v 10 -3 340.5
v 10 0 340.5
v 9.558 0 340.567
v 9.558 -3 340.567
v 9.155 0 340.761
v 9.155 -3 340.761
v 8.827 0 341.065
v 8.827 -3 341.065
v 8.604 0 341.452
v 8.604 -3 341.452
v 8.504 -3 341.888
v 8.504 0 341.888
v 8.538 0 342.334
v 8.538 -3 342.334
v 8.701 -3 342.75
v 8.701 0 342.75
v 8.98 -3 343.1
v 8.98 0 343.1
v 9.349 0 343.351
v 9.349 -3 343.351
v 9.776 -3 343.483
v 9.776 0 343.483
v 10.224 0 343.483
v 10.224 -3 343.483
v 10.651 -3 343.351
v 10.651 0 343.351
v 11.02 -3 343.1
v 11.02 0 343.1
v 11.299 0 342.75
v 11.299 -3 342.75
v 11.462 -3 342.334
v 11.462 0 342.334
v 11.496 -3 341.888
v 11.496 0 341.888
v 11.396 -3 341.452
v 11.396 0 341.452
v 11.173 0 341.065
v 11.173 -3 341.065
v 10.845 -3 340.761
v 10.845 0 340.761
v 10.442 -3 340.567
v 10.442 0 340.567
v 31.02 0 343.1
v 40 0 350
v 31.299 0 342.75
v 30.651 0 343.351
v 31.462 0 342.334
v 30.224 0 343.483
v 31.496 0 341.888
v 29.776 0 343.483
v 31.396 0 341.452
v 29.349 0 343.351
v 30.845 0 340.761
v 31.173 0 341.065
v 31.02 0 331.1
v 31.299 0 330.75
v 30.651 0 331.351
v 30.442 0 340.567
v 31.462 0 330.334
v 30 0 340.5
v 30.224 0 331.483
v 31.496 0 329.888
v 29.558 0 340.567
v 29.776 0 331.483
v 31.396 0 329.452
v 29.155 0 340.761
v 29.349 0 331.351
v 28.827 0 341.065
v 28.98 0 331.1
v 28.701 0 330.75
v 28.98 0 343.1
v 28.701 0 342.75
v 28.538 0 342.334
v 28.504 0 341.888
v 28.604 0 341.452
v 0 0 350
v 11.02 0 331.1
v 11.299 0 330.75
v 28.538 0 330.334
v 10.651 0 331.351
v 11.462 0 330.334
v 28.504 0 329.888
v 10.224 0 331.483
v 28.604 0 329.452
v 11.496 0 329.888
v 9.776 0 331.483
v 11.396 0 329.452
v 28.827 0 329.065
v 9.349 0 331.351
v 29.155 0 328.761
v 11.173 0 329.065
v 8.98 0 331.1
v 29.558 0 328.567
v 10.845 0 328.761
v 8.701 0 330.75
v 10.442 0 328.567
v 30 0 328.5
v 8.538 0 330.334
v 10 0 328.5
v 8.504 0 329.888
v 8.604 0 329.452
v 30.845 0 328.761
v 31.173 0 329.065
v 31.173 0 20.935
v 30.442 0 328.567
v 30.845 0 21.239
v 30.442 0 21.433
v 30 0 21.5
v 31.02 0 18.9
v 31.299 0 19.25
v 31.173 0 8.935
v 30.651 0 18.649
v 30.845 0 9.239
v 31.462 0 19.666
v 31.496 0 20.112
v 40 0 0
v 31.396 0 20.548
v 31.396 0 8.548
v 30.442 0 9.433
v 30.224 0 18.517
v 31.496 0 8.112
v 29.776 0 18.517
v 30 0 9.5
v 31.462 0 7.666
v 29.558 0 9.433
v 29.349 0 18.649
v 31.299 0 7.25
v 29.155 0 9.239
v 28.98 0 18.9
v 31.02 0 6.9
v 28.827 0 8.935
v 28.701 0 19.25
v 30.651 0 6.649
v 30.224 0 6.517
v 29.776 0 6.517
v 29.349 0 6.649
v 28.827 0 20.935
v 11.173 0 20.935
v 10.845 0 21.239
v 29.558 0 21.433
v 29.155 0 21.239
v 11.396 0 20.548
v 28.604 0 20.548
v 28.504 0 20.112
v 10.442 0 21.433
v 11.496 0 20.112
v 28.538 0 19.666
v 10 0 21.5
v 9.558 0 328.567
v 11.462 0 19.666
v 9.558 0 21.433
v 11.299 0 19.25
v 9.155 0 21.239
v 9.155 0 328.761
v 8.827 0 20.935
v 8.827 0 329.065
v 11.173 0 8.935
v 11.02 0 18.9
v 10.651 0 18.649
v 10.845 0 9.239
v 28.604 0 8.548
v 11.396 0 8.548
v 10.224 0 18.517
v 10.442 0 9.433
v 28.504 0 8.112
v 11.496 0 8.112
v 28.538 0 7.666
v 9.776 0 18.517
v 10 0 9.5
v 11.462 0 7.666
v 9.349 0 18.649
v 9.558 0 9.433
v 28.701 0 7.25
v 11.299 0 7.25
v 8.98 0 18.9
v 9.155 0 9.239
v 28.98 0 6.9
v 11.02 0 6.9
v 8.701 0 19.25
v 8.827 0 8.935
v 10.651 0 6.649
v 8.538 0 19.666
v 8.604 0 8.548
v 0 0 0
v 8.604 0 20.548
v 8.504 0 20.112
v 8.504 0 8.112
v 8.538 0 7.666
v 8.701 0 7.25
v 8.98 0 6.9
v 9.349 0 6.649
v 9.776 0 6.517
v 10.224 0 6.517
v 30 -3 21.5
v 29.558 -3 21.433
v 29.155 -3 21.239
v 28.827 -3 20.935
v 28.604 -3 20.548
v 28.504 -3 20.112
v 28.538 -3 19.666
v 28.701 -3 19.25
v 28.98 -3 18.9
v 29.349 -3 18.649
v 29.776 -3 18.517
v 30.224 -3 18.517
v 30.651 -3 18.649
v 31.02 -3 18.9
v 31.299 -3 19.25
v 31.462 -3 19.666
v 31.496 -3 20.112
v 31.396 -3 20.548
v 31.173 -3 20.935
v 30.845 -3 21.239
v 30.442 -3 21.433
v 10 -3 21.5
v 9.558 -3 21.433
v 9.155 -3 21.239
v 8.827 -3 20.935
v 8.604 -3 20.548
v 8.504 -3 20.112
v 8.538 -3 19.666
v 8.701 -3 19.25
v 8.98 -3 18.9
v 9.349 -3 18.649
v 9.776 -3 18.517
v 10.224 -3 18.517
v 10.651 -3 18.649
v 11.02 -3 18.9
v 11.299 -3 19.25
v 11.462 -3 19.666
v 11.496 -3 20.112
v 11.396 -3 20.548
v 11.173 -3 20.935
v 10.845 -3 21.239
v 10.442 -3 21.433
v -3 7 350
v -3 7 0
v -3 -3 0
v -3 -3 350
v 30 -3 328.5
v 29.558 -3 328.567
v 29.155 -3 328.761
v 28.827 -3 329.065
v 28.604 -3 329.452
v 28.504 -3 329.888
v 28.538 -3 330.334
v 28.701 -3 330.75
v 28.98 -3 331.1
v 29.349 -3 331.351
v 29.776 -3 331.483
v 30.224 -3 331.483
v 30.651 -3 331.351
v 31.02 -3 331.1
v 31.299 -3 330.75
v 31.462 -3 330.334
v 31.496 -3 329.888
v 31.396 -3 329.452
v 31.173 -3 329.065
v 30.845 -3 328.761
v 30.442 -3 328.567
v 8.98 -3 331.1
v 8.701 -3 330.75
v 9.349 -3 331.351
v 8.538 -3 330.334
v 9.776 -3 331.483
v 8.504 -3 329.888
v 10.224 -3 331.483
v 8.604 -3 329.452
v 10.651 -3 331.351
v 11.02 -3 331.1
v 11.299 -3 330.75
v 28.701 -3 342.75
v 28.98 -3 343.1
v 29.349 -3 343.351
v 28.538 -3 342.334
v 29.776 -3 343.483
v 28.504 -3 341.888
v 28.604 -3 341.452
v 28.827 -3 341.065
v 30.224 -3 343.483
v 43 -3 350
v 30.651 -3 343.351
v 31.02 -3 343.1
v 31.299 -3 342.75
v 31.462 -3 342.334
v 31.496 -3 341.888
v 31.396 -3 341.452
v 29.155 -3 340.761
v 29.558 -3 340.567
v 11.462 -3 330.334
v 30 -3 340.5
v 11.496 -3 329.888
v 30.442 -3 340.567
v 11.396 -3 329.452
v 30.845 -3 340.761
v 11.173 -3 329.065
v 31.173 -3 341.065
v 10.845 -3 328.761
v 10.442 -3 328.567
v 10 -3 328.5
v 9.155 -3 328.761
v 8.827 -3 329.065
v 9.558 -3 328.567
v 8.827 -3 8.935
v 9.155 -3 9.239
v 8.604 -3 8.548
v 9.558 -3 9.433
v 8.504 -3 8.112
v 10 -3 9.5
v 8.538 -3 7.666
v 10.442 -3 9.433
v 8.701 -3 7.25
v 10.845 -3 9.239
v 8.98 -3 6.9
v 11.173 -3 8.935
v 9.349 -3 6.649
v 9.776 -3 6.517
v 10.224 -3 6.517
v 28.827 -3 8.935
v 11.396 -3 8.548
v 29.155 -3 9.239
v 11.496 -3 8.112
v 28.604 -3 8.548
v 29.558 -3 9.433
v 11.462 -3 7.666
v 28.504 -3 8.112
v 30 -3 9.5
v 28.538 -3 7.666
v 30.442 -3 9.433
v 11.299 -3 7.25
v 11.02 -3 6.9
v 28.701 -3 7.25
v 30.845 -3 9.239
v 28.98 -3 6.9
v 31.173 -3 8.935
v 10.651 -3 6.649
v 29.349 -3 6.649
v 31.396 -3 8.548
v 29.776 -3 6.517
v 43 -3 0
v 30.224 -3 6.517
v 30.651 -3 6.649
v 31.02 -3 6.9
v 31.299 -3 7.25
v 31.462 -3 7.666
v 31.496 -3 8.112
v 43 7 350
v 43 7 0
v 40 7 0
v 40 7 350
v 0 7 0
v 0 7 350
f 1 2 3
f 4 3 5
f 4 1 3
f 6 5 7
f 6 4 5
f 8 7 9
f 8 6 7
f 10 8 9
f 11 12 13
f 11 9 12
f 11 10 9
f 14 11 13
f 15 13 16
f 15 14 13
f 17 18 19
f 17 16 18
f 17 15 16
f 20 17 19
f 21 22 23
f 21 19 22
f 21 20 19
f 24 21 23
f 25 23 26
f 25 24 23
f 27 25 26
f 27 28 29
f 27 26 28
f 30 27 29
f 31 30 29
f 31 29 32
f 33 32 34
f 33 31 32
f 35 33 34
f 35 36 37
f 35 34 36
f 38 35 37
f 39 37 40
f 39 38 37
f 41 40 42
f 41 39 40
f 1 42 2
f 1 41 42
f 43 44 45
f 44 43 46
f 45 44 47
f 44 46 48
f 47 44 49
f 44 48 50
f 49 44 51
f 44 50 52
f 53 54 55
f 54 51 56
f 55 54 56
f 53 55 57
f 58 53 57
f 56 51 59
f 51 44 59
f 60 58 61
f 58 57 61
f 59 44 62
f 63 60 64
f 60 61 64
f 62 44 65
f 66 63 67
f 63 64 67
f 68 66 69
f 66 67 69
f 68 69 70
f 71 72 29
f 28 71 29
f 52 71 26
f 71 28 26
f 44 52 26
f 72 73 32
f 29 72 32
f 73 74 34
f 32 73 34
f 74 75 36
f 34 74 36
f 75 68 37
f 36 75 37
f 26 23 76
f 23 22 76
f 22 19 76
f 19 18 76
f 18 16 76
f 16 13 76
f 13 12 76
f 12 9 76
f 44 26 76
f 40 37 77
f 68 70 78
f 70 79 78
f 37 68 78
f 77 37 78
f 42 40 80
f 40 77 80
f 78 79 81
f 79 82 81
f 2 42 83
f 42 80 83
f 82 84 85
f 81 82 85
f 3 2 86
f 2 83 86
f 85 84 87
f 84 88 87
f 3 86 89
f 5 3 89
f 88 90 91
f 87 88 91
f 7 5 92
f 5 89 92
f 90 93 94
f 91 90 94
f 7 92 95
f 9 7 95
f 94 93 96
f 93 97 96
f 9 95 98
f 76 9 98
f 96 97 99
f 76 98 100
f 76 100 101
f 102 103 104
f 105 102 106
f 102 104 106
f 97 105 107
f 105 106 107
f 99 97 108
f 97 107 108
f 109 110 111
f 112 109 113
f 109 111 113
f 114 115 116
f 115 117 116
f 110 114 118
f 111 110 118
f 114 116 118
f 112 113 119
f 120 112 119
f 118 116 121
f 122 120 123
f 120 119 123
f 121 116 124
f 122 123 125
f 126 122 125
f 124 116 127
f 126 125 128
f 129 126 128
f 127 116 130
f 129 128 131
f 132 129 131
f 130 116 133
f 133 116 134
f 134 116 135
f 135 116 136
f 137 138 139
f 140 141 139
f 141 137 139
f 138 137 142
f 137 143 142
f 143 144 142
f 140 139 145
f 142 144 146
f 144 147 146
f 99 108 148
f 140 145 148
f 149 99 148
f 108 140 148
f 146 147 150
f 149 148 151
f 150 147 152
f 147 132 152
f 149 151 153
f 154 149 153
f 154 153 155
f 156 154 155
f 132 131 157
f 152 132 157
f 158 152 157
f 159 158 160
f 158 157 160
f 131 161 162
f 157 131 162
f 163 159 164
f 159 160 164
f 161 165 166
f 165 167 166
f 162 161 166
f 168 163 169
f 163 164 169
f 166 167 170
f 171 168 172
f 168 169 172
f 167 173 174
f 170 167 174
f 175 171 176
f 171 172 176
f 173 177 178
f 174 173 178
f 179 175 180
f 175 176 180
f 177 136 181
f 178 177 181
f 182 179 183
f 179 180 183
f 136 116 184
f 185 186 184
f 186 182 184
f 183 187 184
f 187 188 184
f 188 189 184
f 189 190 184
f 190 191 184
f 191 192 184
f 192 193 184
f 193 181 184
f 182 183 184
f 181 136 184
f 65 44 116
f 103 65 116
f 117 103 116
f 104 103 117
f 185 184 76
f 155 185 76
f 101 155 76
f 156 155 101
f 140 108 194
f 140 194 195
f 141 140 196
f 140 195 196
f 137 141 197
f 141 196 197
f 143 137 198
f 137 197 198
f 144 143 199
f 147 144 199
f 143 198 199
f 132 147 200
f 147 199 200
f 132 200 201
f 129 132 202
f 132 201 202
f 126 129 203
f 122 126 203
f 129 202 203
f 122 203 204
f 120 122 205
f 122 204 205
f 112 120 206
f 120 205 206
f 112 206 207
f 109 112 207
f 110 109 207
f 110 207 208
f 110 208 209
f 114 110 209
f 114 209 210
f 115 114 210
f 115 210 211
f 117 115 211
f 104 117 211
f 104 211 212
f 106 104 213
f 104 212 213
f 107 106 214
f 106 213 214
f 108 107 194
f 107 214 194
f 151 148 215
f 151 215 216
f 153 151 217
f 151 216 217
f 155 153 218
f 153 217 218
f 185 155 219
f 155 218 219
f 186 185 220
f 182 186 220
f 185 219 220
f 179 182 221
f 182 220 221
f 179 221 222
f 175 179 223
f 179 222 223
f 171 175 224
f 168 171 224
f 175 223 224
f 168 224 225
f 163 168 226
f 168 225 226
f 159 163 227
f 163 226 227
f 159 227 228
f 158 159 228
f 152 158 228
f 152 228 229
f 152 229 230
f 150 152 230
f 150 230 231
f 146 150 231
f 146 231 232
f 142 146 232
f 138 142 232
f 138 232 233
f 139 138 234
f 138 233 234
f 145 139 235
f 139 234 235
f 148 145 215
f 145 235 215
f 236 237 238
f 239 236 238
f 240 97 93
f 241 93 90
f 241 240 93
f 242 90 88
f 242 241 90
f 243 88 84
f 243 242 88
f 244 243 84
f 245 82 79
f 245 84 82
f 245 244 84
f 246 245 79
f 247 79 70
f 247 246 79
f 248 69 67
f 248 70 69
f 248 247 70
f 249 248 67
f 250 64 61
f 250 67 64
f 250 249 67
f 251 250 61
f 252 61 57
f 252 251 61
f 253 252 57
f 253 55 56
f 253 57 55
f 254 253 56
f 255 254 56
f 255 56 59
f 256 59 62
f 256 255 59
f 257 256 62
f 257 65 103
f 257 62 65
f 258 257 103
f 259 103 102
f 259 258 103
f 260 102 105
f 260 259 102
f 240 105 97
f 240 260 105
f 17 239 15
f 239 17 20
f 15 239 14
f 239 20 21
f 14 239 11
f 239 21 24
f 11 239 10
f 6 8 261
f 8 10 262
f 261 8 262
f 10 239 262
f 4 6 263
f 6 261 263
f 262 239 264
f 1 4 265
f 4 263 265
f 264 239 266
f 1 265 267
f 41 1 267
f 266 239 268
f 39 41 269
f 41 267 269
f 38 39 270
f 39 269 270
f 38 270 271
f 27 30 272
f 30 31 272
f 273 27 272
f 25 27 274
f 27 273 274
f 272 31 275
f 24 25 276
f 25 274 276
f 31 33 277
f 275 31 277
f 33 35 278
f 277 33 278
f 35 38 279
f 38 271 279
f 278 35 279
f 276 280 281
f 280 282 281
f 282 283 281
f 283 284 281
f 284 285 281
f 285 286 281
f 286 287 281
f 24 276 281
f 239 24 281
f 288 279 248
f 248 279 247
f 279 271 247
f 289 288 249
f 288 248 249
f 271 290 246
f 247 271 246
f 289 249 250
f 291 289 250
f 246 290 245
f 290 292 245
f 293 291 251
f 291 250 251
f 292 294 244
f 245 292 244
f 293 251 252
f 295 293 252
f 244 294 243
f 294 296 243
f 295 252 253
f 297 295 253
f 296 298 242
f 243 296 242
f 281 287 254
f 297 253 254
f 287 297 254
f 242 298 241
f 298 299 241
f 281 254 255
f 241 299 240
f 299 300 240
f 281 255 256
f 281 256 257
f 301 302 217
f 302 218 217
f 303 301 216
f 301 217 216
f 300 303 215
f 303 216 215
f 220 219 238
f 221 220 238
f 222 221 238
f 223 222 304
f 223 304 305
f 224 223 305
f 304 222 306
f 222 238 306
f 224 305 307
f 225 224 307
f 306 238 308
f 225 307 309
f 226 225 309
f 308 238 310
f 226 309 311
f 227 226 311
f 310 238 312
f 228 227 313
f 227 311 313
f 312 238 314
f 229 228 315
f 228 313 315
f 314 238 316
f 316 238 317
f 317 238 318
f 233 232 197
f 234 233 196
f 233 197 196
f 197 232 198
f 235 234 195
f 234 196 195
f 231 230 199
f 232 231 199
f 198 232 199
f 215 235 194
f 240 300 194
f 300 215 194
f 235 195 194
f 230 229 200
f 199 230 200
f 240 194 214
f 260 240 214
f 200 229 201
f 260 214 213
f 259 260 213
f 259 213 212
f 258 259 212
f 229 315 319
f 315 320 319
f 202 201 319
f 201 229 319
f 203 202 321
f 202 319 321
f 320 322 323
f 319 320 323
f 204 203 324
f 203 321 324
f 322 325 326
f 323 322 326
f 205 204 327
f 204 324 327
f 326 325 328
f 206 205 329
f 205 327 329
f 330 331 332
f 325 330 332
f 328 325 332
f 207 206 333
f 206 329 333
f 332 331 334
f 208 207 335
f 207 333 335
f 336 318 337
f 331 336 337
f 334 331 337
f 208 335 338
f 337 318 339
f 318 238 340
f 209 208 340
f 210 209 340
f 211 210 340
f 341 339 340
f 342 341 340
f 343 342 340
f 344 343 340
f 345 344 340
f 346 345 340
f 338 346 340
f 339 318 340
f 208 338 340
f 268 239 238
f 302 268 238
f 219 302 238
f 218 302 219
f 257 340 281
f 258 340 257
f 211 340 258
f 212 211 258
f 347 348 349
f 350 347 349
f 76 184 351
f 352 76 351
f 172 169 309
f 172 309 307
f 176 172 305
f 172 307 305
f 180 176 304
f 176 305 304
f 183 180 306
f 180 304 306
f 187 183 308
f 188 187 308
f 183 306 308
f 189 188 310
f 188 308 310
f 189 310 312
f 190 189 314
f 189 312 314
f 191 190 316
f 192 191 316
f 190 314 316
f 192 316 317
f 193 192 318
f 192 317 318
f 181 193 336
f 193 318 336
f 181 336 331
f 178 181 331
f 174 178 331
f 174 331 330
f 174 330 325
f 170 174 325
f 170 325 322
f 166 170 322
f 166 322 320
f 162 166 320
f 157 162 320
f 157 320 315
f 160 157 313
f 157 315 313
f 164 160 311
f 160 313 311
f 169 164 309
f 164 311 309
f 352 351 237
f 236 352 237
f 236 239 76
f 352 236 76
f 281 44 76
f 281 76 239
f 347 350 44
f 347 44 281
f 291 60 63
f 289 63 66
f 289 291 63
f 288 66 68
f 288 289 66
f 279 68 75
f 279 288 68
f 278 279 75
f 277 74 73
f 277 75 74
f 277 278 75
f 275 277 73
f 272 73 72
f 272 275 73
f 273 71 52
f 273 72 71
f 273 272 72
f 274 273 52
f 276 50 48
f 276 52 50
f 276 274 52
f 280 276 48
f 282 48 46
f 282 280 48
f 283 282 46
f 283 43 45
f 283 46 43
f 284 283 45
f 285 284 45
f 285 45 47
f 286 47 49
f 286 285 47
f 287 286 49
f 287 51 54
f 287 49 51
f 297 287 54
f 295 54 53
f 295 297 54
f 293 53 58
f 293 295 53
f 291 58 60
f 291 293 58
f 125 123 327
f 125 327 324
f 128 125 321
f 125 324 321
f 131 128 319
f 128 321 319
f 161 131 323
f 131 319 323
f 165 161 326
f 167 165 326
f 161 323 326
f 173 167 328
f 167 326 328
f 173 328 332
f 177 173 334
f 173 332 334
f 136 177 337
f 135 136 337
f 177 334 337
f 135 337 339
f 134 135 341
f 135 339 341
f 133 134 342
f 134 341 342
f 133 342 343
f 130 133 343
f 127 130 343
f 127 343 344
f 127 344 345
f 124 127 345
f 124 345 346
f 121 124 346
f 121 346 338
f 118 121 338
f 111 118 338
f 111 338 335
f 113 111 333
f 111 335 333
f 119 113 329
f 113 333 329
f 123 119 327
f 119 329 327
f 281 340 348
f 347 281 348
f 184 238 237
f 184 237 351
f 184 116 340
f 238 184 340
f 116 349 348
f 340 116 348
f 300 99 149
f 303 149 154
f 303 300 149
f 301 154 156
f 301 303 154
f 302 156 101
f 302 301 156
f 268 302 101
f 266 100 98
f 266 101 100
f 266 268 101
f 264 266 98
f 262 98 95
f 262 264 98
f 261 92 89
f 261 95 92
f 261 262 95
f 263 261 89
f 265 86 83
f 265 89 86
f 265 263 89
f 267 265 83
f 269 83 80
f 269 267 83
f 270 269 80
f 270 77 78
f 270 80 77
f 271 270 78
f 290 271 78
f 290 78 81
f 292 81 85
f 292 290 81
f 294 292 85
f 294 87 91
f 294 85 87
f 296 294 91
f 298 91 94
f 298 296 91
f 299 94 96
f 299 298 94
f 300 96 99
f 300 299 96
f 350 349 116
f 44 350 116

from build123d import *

# Parameters (mm, degrees)
BOSS_EXTRUDE1_DEPTH            = 350
F_3_0MM_DOWEL_HOLE1_AT_2_COUNT = 2
F_3_0MM_DOWEL_HOLE1_AT_2_PITCH = 20
F_3_0MM_DOWEL_HOLE1_AT_3_COUNT = 2
F_3_0MM_DOWEL_HOLE1_AT_3_PITCH = 23.323807579
F_3_0MM_DOWEL_HOLE1_AT_4_COUNT = 2
F_3_0MM_DOWEL_HOLE1_AT_4_PITCH = 12


with BuildPart() as part:
    # Sketch2 → Boss-Extrude1 (new body)
    with BuildSketch(Plane.XY):
        Polygon((0, 0), (0, 7), (-3, 7), (-3, -3), (43, -3), (43, 7), (40, 7), (40, 0), align=None)
    extrude(amount=BOSS_EXTRUDE1_DEPTH)

    # Sketch3 → Ø3.0mm Dowel Hole1 (revolve, cut)
    with BuildSketch(Plane(origin=(10, -3, 342), x_dir=(0, 0, -1), z_dir=(1, 0, 0))):
        Polygon((0, 0), (0, 15.901290929), (1.5, 15), (1.5, 0), align=None)
    f_3_0mm_dowel_hole1 = revolve(axis=Axis((10, -9.35, 342), (0, 1, 0)), mode=Mode.SUBTRACT)

    # Ø3.0mm Dowel Hole1 at 2: Ø3.0mm Dowel Hole1 ×2
    with Locations(*[(i * F_3_0MM_DOWEL_HOLE1_AT_2_PITCH, 0, 0) for i in range(1, F_3_0MM_DOWEL_HOLE1_AT_2_COUNT)]):
        add(f_3_0mm_dowel_hole1, mode=Mode.SUBTRACT)

    # Ø3.0mm Dowel Hole1 at 3: Ø3.0mm Dowel Hole1 ×2
    with Locations(*[Vector(0.857492926, 0, -0.514495755) * (i * F_3_0MM_DOWEL_HOLE1_AT_3_PITCH) for i in range(1, F_3_0MM_DOWEL_HOLE1_AT_3_COUNT)]):
        add(f_3_0mm_dowel_hole1, mode=Mode.SUBTRACT)

    # Ø3.0mm Dowel Hole1 at 4: Ø3.0mm Dowel Hole1 ×2
    with Locations(*[(0, 0, -i * F_3_0MM_DOWEL_HOLE1_AT_4_PITCH) for i in range(1, F_3_0MM_DOWEL_HOLE1_AT_4_COUNT)]):
        add(f_3_0mm_dowel_hole1, mode=Mode.SUBTRACT)

    # Mirror1: Ø3.0mm Dowel Hole1 across plane
    add(f_3_0mm_dowel_hole1.mirror(Plane.XY.offset(175)), mode=Mode.SUBTRACT)

    # Mirror1 copy 1 sketch → Mirror1 copy 1 (revolve, cut)
    with BuildSketch(Plane(origin=(30, -3, 8), x_dir=(0, 0, 1), z_dir=(1, 0, 0))):
        Polygon((0, 0), (0, -15.901290929), (1.5, -15), (1.5, 0), align=None)
    revolve(axis=Axis((30, -9.35, 8), (0, -1, 0)), mode=Mode.SUBTRACT)

    # Mirror1 copy 2 sketch → Mirror1 copy 2 (revolve, cut)
    with BuildSketch(Plane(origin=(30, -3, 20), x_dir=(0, 0, 1), z_dir=(1, 0, 0))):
        Polygon((0, 0), (0, -15.901290929), (1.5, -15), (1.5, 0), align=None)
    revolve(axis=Axis((30, -9.35, 20), (0, -1, 0)), mode=Mode.SUBTRACT)

    # Mirror1 copy 3 sketch → Mirror1 copy 3 (revolve, cut)
    with BuildSketch(Plane(origin=(10, -3, 20), x_dir=(0, 0, 1), z_dir=(1, 0, 0))):
        Polygon((0, 0), (0, -15.901290929), (1.5, -15), (1.5, 0), align=None)
    revolve(axis=Axis((10, -9.35, 20), (0, -1, 0)), mode=Mode.SUBTRACT)


solid = part.part
